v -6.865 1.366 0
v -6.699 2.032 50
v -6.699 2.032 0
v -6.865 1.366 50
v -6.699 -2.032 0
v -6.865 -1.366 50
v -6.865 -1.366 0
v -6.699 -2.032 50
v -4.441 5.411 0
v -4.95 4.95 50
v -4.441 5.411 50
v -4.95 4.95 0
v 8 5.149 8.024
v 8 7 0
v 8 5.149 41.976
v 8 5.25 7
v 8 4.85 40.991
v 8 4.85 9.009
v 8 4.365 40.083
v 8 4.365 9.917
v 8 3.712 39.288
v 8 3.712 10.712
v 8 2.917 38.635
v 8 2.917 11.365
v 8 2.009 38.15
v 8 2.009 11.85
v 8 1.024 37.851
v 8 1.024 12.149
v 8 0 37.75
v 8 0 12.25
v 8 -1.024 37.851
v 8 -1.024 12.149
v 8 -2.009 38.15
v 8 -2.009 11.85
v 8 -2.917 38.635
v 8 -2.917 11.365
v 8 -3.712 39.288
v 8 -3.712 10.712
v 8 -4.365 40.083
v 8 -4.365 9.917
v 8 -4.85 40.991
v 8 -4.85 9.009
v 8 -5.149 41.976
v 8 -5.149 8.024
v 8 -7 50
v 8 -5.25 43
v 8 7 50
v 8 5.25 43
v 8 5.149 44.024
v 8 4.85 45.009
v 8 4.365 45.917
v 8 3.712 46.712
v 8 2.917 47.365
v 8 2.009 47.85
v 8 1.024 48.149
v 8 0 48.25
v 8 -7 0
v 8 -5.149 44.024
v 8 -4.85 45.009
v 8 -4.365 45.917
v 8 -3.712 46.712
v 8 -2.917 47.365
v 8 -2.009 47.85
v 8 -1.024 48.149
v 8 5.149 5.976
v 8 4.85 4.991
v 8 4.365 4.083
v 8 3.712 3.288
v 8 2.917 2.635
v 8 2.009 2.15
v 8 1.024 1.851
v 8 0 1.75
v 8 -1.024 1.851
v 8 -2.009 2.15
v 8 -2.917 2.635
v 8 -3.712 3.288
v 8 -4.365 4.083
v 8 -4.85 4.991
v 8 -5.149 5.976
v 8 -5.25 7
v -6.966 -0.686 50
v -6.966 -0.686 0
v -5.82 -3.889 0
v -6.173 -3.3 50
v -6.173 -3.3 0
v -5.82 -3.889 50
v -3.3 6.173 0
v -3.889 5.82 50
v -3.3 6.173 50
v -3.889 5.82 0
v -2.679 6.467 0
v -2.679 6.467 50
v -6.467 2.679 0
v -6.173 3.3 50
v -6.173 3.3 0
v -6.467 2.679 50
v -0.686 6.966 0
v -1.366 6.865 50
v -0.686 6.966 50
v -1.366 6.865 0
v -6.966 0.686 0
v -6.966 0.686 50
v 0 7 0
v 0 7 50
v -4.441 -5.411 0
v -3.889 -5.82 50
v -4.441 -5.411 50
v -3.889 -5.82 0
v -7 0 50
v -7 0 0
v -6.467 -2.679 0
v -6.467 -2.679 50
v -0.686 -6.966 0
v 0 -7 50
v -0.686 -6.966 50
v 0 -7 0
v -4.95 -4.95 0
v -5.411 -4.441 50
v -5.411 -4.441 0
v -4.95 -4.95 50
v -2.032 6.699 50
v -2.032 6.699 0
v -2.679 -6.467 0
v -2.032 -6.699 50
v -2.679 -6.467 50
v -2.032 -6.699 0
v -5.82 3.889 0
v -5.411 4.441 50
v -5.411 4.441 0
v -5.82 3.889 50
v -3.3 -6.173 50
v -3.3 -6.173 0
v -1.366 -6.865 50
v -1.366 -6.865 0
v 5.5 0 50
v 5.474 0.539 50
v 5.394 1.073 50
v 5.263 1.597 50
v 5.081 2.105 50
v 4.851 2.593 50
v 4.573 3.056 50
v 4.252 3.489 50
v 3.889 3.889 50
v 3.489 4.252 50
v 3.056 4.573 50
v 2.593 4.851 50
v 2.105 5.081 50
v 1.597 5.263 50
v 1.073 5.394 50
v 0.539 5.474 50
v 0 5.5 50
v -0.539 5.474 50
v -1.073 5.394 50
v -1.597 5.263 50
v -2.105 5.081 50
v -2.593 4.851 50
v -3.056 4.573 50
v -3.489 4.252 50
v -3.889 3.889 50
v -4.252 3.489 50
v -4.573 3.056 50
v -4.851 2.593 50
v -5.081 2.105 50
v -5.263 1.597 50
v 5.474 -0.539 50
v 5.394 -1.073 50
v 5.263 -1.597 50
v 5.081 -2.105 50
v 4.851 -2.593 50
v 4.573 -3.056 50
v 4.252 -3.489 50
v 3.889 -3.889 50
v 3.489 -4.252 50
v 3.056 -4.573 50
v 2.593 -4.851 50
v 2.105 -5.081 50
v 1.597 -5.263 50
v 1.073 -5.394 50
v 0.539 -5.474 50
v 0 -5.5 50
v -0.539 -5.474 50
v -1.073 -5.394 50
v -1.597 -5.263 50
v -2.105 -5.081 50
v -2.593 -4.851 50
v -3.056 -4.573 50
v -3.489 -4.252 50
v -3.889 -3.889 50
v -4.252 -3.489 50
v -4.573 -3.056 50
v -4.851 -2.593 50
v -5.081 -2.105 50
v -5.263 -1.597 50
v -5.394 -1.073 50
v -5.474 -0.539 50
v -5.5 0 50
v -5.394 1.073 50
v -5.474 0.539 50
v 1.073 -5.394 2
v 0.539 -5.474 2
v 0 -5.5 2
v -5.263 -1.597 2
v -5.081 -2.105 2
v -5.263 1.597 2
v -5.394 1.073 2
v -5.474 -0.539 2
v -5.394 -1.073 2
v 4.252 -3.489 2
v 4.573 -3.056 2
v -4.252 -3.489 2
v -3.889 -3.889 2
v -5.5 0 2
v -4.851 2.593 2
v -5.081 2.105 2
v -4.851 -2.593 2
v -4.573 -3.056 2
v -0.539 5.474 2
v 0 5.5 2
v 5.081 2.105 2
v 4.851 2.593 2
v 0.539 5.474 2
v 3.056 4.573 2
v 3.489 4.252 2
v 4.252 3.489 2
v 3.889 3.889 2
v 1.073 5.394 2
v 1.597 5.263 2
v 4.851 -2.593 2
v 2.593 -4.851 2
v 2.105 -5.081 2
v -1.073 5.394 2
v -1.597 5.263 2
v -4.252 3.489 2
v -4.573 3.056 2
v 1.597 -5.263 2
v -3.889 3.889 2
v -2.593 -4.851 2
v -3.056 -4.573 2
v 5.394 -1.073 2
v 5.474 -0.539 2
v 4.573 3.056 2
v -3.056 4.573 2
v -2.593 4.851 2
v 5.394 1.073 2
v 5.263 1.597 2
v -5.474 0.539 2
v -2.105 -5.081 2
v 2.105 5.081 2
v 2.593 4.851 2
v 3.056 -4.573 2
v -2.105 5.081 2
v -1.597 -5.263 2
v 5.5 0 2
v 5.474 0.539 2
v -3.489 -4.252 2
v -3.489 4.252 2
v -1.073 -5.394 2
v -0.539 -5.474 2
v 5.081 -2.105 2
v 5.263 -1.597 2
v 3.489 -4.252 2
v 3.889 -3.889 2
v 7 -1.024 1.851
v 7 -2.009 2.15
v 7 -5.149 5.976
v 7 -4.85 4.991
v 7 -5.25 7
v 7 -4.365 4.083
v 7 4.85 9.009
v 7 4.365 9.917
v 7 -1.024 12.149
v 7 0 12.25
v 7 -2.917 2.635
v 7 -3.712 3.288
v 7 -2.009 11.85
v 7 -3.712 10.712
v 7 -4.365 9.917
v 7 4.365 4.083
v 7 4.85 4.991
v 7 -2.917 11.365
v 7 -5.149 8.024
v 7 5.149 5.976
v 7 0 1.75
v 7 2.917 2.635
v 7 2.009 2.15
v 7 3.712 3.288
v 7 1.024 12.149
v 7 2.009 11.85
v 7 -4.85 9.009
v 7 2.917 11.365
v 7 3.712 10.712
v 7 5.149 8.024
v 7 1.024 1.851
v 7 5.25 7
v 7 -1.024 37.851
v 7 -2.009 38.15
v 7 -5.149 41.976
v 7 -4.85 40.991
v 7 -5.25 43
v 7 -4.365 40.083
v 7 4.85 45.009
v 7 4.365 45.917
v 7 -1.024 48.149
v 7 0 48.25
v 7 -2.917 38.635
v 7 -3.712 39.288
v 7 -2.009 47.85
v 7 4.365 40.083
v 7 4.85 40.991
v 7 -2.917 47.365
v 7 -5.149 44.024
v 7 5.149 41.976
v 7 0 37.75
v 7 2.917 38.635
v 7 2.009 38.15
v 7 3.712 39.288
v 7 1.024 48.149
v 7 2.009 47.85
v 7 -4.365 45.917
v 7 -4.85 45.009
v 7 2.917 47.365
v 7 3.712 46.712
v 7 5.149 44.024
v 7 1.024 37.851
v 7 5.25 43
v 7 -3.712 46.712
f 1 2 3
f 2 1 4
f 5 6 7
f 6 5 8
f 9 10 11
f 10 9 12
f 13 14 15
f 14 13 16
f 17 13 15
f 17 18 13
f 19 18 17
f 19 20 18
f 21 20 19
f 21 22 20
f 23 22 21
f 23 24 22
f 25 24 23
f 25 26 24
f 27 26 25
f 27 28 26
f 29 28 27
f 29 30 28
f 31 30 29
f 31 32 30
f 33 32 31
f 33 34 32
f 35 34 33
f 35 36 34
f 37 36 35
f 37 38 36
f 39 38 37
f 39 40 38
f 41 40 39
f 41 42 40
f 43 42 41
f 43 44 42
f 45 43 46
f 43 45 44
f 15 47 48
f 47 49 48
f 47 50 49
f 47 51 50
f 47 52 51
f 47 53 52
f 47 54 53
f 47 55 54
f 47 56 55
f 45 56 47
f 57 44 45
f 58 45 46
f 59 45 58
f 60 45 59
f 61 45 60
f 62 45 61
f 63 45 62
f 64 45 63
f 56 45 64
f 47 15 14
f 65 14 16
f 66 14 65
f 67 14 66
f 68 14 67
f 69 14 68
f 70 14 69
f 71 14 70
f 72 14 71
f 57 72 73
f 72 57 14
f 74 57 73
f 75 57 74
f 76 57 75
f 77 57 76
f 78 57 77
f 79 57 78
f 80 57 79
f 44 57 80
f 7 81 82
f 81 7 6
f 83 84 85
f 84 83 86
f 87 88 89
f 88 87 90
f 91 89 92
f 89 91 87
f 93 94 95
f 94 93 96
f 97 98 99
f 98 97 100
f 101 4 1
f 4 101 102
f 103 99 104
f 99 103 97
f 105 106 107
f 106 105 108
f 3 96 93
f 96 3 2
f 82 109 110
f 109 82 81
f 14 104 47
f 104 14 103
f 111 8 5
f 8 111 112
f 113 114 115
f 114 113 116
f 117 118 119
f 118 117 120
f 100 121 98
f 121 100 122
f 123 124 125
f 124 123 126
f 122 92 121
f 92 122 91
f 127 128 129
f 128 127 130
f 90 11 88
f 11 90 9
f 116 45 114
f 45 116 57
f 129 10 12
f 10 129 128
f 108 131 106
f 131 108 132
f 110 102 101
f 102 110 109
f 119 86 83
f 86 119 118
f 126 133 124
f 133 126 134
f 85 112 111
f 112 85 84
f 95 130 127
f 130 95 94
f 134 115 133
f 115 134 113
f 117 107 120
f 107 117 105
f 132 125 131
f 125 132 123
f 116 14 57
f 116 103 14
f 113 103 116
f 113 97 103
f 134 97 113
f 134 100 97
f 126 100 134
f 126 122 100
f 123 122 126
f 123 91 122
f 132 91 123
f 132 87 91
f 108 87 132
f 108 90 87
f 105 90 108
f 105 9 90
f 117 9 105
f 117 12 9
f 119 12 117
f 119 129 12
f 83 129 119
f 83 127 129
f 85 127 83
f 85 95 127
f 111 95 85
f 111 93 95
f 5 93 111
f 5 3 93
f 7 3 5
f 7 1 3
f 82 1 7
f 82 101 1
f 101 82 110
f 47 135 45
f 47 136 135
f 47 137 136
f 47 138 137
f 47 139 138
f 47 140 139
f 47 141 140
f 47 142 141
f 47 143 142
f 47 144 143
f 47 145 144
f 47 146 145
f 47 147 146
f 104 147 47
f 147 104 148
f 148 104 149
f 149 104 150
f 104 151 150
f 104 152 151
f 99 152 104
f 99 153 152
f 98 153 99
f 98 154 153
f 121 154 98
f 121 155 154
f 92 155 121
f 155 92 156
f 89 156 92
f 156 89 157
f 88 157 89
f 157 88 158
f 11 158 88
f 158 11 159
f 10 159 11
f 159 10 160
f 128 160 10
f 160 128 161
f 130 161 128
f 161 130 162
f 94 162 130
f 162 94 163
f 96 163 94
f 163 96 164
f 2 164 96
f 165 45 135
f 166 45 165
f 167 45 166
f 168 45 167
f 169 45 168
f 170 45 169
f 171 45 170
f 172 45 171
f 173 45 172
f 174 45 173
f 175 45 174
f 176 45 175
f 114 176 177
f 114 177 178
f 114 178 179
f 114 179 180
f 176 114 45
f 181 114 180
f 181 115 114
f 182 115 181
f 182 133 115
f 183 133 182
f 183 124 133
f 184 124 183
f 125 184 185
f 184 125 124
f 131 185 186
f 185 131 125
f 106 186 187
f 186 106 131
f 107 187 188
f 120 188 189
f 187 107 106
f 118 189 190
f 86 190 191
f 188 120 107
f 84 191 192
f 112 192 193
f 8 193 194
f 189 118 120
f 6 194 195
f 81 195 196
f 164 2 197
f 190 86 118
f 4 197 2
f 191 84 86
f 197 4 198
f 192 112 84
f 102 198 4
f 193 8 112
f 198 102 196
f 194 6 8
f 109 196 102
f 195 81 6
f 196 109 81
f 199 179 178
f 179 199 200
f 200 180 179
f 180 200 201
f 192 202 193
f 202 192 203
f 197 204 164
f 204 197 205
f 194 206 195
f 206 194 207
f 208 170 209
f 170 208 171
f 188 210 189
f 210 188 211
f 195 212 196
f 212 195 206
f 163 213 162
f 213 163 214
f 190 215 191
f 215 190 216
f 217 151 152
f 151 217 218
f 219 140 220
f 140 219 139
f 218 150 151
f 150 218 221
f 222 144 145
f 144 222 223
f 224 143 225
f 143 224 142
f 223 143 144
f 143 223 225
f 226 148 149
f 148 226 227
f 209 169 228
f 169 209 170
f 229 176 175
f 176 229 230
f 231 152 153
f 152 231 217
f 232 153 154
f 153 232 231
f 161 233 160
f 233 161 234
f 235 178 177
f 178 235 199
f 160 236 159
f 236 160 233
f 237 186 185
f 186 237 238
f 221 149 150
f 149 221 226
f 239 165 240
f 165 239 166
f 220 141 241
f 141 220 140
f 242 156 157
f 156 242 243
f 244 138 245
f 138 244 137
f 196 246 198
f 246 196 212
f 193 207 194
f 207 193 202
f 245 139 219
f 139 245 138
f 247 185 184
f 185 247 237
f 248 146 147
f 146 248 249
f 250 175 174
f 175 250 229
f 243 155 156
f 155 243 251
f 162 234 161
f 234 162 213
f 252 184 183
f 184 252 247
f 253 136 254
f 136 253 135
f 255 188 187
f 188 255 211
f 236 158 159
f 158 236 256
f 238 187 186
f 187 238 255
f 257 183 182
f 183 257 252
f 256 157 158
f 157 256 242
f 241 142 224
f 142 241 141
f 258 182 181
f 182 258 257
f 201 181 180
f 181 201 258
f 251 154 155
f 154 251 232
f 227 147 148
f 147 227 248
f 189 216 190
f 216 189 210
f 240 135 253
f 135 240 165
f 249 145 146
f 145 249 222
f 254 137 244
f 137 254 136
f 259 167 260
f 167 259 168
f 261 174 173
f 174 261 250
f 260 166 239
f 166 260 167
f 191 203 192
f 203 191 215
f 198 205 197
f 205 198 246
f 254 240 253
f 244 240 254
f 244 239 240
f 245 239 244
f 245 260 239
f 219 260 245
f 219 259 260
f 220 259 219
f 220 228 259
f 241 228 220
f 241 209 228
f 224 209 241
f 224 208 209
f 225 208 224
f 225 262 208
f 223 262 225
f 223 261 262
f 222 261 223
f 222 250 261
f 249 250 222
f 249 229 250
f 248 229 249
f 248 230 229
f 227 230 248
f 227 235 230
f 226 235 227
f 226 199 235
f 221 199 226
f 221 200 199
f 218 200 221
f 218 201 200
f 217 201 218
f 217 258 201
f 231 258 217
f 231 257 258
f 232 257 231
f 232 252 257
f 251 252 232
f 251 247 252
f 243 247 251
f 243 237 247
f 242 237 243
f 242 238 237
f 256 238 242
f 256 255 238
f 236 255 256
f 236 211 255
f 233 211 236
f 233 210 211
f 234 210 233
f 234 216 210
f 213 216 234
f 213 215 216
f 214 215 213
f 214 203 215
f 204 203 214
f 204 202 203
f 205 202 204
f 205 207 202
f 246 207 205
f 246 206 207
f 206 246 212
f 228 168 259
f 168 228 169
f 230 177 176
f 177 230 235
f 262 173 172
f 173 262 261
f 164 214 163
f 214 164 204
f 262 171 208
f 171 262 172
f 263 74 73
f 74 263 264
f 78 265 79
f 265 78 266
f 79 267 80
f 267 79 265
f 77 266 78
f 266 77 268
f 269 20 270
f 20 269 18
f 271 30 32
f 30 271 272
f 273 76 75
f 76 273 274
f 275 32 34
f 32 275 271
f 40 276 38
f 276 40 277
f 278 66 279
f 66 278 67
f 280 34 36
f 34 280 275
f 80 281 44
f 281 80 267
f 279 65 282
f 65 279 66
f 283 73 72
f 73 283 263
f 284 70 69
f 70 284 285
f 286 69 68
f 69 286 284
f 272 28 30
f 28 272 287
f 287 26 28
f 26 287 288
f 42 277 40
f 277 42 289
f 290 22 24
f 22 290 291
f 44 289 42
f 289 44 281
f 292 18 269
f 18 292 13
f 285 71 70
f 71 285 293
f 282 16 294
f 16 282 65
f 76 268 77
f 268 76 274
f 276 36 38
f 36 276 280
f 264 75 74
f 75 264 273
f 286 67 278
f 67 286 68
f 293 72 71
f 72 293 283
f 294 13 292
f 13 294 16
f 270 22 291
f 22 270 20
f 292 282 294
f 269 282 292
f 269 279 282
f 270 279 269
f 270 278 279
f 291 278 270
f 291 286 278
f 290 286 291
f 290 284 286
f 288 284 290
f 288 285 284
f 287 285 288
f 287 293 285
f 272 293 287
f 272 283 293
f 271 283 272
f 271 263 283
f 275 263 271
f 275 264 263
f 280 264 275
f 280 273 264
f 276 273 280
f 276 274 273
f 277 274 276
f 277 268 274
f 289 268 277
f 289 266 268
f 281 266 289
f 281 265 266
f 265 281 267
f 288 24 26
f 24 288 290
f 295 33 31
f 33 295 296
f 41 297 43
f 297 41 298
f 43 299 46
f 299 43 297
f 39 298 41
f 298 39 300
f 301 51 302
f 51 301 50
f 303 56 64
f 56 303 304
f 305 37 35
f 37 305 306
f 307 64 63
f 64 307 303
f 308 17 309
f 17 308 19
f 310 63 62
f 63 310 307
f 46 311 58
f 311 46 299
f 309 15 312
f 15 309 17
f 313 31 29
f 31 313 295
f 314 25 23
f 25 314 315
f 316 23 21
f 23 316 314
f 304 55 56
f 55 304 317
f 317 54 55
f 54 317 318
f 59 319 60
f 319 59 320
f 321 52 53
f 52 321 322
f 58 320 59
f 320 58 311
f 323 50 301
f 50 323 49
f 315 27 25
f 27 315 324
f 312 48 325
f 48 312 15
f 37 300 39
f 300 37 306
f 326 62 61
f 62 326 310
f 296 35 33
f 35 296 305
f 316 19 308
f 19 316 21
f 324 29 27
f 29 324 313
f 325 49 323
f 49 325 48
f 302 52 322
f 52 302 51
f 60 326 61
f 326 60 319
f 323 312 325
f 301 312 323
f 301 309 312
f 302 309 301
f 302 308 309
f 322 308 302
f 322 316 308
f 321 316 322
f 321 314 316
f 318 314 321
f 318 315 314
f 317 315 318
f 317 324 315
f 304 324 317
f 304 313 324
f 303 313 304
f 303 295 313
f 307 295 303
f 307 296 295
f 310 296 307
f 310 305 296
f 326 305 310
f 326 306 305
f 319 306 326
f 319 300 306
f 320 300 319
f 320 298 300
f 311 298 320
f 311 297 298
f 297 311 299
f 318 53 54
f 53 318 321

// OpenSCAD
//All units in mm.

//Total height of the holder.
total_height=50; //[0:100]

//Diameter of the pen. 
pen_diameter=10; //[5:50]

//Diameter of the magnets. Must not be larger than the pen diameter!
magnet_diameter=10; //[1:20]

//Height of the magnets. This also changes the thickness of the back wall.
magnet_height=1; //[1:20]

//Calculate outer wall (2mm)
outer_diameter=pen_diameter+4;

rotate([0,0,-90])
difference()
{
difference()
{
linear_extrude(height=total_height,convexity=10)
union()
{
circle(r=(outer_diameter/2), $fn=64);
translate([-(outer_diameter/2),0,0])
square([outer_diameter,magnet_height+(outer_diameter/2)]);
}


translate([0,0,2])
linear_extrude(height=total_height,convexity=10)
circle(r=(pen_diameter/2)+0.5, $fn=64);
}

translate([0,outer_diameter/2,(magnet_diameter/2)+2])
rotate([-90,0,0])
cylinder(h=magnet_height+1,r=(magnet_diameter/2)+0.25,$fn=32);

translate([0,outer_diameter/2,total_height-((magnet_diameter/2)+2)])
rotate([-90,0,0])
cylinder(h=magnet_height+1,r=(magnet_diameter/2)+0.25, $fn=32);

}

